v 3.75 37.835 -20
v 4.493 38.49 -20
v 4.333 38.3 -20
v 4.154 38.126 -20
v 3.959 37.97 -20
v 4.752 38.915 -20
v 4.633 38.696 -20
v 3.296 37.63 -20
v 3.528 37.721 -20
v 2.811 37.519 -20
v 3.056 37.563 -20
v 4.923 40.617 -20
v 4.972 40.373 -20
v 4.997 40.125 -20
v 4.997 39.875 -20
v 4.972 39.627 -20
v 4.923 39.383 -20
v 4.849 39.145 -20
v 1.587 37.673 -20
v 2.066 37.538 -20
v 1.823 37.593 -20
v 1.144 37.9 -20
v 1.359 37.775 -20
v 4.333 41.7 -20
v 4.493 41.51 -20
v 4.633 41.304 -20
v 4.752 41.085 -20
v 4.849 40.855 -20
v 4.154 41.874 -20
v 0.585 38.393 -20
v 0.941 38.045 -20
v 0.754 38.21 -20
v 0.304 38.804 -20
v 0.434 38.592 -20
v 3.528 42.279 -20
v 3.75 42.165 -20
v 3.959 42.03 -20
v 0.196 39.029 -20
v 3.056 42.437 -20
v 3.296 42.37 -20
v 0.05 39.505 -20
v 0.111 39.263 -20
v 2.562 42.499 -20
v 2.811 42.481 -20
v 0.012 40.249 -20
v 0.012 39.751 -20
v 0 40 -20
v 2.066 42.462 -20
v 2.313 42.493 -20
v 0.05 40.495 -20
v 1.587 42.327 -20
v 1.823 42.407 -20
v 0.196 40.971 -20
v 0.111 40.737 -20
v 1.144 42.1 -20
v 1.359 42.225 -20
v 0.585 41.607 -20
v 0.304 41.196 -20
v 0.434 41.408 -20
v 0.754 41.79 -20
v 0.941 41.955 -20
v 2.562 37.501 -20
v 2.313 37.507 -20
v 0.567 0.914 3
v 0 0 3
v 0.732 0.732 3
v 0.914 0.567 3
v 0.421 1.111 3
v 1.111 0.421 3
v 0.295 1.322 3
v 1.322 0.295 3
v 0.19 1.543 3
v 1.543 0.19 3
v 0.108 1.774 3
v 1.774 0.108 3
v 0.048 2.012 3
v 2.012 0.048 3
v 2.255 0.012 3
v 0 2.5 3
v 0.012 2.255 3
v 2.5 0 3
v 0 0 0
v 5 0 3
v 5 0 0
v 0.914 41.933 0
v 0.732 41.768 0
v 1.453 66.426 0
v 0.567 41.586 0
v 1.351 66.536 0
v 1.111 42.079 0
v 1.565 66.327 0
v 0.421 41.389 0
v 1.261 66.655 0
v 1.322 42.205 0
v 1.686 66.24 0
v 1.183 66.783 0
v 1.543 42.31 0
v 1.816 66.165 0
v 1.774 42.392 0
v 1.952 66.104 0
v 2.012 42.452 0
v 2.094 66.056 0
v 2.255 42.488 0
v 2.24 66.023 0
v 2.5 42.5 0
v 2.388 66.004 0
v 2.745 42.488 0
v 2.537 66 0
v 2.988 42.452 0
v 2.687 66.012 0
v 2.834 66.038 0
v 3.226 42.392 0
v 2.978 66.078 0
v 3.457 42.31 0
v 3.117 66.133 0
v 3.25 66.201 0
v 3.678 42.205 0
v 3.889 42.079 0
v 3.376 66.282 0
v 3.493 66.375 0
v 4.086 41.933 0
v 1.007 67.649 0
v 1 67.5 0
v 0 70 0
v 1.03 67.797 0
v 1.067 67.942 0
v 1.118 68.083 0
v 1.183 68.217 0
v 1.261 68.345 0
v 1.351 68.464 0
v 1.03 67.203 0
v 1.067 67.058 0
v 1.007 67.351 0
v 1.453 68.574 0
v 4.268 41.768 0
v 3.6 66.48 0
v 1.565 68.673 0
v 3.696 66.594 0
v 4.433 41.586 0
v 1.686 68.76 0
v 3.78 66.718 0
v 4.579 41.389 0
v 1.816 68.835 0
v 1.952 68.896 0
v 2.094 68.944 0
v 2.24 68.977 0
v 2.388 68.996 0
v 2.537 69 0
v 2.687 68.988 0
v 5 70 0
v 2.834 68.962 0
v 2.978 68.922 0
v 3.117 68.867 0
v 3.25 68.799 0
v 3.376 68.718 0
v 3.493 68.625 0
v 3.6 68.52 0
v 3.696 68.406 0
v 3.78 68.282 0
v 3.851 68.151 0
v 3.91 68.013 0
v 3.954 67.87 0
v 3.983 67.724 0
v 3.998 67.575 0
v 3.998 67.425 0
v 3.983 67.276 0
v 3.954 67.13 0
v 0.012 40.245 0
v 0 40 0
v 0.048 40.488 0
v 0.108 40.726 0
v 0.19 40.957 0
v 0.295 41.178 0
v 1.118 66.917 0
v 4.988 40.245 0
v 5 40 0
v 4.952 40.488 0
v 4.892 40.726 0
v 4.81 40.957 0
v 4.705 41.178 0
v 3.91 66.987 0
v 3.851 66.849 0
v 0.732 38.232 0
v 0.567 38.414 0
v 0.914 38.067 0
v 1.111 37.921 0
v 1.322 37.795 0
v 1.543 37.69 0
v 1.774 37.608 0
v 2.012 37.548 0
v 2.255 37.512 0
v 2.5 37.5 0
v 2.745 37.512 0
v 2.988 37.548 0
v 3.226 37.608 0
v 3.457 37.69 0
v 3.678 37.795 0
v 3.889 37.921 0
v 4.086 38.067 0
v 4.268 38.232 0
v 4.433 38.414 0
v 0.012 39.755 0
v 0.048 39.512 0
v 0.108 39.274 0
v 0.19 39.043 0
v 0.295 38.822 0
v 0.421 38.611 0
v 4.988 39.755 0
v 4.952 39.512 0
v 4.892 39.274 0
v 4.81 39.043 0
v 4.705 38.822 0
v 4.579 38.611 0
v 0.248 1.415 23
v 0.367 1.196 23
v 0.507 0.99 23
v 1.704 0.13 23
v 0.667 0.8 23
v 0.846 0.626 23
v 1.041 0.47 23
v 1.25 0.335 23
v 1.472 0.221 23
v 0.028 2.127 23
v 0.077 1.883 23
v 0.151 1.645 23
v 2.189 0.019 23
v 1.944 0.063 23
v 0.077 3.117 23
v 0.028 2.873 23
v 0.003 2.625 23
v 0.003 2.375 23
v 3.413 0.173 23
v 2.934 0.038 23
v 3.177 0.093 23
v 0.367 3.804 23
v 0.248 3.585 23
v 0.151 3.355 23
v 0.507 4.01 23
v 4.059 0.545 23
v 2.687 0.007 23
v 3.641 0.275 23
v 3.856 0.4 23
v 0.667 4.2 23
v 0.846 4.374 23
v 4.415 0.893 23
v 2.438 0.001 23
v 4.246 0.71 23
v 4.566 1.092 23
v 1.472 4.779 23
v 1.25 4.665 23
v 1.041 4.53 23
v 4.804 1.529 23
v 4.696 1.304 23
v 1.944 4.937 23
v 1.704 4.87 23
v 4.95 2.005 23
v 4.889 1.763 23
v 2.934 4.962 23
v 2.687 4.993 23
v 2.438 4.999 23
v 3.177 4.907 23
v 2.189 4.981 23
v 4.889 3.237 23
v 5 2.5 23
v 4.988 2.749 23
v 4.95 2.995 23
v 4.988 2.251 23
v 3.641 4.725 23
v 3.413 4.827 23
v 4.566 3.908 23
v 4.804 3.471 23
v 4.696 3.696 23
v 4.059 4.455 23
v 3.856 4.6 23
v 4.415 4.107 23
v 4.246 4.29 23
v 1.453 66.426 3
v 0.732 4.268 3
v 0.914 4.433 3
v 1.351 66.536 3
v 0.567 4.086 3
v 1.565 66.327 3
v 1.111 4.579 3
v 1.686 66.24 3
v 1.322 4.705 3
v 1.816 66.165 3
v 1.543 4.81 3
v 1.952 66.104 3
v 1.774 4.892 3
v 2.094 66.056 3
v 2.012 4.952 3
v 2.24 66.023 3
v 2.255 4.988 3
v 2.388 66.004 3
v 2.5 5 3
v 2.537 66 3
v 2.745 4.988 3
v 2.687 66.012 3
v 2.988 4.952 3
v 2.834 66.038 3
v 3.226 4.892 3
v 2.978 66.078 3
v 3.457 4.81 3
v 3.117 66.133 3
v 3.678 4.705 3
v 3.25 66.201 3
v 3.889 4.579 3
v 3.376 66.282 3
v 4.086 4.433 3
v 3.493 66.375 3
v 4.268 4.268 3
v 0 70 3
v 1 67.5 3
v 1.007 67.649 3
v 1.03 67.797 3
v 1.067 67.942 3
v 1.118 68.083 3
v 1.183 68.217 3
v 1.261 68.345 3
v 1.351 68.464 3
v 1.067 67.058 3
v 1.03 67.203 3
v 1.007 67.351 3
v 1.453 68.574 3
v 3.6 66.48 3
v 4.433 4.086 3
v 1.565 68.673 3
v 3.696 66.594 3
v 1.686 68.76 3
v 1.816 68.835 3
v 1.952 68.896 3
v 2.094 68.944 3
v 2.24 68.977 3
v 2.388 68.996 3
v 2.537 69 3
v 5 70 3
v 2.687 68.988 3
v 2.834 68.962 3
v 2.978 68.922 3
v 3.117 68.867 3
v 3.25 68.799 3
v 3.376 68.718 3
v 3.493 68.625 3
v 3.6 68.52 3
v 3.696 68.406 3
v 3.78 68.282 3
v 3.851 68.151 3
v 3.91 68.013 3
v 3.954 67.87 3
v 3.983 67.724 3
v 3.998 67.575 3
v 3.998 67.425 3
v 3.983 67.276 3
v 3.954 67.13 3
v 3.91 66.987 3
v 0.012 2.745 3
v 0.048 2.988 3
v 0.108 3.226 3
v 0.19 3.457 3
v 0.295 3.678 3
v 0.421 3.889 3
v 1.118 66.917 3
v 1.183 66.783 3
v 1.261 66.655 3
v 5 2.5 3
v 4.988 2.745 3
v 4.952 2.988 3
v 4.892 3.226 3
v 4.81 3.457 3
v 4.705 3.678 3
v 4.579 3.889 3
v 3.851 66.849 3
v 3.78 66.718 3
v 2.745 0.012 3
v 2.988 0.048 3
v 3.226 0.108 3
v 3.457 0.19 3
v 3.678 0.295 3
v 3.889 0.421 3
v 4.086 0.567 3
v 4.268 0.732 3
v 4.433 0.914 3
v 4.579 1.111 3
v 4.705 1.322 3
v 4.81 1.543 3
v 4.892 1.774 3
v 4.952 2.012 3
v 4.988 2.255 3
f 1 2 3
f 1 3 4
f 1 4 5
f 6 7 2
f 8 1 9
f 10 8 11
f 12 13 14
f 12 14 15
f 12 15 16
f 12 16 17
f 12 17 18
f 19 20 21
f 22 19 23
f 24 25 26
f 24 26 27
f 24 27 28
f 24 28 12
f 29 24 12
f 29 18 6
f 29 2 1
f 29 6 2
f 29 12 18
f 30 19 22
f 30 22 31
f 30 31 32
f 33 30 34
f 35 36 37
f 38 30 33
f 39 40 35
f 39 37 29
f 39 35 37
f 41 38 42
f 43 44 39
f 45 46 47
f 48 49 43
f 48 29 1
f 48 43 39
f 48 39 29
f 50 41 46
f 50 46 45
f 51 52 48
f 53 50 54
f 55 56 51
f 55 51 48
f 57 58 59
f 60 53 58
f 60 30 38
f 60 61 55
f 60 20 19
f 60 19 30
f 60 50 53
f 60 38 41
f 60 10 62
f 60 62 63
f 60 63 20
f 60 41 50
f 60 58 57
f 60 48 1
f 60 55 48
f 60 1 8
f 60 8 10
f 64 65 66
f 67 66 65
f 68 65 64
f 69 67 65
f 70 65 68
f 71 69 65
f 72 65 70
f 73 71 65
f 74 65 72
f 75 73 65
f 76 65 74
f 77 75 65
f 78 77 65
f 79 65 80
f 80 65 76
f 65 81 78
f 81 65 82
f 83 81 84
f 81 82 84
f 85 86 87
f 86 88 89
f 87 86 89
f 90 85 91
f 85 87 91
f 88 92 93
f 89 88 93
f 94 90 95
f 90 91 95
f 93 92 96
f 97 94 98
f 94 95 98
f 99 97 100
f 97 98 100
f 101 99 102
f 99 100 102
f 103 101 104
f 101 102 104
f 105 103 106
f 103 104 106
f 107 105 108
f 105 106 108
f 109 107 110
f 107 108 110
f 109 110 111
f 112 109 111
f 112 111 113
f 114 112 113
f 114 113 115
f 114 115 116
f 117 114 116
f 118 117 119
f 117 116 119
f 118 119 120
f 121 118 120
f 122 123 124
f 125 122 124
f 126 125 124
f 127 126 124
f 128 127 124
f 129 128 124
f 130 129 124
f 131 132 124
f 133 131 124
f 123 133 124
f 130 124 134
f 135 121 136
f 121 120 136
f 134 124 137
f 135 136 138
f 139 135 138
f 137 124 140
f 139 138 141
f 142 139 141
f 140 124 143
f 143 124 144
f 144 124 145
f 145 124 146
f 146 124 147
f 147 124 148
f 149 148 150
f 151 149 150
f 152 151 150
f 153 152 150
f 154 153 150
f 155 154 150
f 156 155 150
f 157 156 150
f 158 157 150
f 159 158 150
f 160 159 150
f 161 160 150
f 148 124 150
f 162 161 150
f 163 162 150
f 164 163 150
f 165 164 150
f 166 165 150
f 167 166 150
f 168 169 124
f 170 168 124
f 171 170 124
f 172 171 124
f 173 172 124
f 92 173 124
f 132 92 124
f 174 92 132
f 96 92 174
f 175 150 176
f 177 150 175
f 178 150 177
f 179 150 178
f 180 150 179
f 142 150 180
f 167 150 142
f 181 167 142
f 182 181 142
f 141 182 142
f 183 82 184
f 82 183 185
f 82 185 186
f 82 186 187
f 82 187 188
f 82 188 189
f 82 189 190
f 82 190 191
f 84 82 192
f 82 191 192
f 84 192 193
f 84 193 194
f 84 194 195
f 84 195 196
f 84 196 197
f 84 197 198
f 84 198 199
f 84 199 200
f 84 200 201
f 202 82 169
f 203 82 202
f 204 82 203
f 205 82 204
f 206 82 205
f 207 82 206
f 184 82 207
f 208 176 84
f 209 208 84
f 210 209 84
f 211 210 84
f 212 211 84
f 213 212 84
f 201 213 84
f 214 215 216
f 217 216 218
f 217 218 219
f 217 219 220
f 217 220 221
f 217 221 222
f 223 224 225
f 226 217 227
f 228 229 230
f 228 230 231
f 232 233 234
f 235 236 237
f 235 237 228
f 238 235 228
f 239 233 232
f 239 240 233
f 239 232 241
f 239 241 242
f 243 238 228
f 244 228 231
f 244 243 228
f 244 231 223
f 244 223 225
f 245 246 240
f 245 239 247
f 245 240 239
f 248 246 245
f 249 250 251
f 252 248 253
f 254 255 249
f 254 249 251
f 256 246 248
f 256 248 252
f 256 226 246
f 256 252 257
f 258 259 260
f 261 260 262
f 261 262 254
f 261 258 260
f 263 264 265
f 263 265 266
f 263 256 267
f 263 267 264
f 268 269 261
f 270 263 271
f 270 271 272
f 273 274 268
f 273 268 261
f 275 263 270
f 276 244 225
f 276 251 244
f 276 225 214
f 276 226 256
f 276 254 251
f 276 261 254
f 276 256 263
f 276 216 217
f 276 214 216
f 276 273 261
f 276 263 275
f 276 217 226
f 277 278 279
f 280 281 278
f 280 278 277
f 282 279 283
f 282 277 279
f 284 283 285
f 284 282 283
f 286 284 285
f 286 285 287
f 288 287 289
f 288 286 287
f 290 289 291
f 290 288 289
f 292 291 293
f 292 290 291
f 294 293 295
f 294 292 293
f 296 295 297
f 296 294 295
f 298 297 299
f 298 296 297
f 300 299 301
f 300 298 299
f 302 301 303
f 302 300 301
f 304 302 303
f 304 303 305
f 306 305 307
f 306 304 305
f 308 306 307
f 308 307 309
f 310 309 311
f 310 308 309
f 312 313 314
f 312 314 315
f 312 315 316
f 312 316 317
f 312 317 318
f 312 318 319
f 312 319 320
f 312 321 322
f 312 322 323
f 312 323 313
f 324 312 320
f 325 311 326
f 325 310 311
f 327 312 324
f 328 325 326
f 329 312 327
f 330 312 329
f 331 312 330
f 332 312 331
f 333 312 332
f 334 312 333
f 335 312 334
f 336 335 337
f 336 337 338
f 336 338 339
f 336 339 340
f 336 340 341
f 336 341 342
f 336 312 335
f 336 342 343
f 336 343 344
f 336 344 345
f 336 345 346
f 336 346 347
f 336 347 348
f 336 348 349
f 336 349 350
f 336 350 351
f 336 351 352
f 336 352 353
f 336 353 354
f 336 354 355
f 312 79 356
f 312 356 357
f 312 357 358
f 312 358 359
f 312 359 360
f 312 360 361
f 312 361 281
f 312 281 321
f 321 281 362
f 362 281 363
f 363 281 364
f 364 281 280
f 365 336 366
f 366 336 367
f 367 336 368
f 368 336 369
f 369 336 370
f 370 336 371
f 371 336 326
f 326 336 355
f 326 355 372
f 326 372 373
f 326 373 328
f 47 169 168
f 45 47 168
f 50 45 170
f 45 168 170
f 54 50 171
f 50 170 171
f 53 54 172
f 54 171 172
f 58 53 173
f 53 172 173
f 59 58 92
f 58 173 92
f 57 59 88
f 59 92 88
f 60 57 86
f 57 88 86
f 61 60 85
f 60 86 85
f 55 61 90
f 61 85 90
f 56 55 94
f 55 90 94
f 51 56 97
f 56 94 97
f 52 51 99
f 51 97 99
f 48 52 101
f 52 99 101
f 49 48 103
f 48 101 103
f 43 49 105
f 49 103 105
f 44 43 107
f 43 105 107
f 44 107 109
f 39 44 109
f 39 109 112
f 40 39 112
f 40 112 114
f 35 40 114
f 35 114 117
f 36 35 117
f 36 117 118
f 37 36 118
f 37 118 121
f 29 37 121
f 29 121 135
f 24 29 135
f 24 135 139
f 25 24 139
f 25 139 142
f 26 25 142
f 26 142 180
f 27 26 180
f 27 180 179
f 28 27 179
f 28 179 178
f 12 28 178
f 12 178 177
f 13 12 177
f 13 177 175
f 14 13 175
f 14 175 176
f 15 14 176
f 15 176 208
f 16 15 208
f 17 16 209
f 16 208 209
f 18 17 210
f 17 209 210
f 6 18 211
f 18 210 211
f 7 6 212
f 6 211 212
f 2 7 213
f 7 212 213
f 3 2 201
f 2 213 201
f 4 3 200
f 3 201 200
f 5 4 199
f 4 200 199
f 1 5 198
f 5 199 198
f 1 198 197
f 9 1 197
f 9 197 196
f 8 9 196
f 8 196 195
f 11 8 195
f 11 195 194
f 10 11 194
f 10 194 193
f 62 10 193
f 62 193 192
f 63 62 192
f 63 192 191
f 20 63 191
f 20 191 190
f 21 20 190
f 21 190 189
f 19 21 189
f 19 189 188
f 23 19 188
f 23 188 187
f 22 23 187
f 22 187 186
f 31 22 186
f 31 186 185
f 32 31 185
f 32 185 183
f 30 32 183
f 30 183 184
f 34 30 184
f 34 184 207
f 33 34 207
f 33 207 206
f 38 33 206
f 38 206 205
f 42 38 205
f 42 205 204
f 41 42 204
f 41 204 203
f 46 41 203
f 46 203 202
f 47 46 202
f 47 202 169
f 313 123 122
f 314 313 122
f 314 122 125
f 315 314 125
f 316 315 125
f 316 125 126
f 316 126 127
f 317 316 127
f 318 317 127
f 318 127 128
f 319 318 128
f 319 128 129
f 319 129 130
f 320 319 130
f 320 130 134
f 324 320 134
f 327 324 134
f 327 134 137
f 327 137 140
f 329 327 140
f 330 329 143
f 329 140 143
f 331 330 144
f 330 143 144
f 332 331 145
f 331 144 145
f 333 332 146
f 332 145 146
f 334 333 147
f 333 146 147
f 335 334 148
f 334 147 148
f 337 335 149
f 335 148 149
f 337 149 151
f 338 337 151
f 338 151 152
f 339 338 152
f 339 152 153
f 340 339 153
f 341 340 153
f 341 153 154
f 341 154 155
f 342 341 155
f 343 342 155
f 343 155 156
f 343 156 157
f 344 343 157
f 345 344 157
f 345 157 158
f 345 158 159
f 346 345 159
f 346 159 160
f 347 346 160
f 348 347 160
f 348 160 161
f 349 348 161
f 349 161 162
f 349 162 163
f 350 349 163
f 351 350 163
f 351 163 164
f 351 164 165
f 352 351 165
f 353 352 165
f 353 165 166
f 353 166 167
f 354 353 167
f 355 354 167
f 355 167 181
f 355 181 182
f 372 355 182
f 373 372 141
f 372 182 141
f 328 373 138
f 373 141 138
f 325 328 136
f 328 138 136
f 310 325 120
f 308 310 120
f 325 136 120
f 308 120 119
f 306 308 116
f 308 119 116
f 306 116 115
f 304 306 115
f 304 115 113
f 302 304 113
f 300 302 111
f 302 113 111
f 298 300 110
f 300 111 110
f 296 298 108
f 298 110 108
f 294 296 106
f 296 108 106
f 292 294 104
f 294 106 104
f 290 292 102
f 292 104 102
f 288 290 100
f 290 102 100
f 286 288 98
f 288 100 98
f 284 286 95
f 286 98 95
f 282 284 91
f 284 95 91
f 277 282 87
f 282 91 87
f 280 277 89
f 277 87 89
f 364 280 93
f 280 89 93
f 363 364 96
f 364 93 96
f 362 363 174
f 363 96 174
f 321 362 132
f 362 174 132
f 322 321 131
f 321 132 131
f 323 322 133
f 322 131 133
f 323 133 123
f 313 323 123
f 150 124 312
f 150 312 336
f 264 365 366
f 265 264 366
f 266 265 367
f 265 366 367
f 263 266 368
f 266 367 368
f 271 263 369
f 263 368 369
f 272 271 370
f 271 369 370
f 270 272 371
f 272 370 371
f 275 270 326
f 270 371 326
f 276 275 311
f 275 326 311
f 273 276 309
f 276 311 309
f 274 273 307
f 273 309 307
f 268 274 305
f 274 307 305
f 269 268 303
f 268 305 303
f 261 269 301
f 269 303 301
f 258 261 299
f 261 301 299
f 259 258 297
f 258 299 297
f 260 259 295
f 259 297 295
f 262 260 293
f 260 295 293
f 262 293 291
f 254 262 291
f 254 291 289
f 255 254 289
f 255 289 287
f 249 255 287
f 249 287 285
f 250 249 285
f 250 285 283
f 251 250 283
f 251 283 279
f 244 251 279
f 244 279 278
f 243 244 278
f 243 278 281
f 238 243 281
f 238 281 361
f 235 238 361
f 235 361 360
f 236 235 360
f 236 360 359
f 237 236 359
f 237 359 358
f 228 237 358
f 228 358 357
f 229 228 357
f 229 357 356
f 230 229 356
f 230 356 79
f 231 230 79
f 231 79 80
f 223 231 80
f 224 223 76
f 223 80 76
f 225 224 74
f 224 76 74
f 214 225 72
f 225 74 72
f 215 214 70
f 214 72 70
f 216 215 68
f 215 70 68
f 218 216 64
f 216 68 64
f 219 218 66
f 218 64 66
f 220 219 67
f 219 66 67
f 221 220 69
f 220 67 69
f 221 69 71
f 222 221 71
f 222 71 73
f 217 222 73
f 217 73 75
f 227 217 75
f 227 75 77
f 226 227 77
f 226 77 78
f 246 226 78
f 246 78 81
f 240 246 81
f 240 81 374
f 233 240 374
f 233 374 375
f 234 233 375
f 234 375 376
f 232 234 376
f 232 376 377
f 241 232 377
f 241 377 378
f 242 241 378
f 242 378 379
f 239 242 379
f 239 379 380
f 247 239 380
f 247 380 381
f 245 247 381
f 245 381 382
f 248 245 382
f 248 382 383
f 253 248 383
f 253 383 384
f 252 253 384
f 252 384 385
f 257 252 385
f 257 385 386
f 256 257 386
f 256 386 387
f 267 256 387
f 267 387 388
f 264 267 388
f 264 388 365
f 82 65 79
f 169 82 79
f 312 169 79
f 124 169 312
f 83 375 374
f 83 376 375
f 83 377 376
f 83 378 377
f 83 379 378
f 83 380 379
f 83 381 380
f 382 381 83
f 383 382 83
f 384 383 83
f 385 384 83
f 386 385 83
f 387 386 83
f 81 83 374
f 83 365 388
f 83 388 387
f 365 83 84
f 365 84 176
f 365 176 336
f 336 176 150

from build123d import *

# Parameters (mm, degrees)
SKETCH1_W           = 5
SKETCH1_H           = 70
BOSS_EXTRUDE1_DEPTH = 3
SKETCH2_R           = 2.5
BOSS_EXTRUDE2_DEPTH = 20
SKETCH3_R           = 2.5
BOSS_EXTRUDE3_DEPTH = 20
SKETCH4_R           = 1.5
CUT_EXTRUDE1_DEPTH  = 20


with BuildPart() as part:
    # Sketch1 → Boss-Extrude1 (new body)
    with BuildSketch(Plane.XY):
        with Locations((2.5, 35)):
            Rectangle(SKETCH1_W, SKETCH1_H)
    extrude(amount=BOSS_EXTRUDE1_DEPTH)

    # Sketch2 → Boss-Extrude2 (add)
    with BuildSketch(Plane.XY.offset(3)):
        with Locations((2.5, 2.5)):
            Circle(SKETCH2_R)
    extrude(amount=BOSS_EXTRUDE2_DEPTH)

    # Sketch3 → Boss-Extrude3 (add)
    with BuildSketch(Plane(origin=(0, 0, 0), x_dir=(-1, 0, 0), z_dir=(0, 0, -1))):
        with Locations((-2.5, 40)):
            Circle(SKETCH3_R)
    extrude(amount=BOSS_EXTRUDE3_DEPTH)

    # Sketch4 → Cut-Extrude1 (cut)
    with BuildSketch(Plane(origin=(0, 0, 0), x_dir=(-1, 0, 0), z_dir=(0, 0, -1))):
        with Locations((-2.5, 67.5)):
            Circle(SKETCH4_R)
    extrude(amount=-CUT_EXTRUDE1_DEPTH, mode=Mode.SUBTRACT)


solid = part.part
